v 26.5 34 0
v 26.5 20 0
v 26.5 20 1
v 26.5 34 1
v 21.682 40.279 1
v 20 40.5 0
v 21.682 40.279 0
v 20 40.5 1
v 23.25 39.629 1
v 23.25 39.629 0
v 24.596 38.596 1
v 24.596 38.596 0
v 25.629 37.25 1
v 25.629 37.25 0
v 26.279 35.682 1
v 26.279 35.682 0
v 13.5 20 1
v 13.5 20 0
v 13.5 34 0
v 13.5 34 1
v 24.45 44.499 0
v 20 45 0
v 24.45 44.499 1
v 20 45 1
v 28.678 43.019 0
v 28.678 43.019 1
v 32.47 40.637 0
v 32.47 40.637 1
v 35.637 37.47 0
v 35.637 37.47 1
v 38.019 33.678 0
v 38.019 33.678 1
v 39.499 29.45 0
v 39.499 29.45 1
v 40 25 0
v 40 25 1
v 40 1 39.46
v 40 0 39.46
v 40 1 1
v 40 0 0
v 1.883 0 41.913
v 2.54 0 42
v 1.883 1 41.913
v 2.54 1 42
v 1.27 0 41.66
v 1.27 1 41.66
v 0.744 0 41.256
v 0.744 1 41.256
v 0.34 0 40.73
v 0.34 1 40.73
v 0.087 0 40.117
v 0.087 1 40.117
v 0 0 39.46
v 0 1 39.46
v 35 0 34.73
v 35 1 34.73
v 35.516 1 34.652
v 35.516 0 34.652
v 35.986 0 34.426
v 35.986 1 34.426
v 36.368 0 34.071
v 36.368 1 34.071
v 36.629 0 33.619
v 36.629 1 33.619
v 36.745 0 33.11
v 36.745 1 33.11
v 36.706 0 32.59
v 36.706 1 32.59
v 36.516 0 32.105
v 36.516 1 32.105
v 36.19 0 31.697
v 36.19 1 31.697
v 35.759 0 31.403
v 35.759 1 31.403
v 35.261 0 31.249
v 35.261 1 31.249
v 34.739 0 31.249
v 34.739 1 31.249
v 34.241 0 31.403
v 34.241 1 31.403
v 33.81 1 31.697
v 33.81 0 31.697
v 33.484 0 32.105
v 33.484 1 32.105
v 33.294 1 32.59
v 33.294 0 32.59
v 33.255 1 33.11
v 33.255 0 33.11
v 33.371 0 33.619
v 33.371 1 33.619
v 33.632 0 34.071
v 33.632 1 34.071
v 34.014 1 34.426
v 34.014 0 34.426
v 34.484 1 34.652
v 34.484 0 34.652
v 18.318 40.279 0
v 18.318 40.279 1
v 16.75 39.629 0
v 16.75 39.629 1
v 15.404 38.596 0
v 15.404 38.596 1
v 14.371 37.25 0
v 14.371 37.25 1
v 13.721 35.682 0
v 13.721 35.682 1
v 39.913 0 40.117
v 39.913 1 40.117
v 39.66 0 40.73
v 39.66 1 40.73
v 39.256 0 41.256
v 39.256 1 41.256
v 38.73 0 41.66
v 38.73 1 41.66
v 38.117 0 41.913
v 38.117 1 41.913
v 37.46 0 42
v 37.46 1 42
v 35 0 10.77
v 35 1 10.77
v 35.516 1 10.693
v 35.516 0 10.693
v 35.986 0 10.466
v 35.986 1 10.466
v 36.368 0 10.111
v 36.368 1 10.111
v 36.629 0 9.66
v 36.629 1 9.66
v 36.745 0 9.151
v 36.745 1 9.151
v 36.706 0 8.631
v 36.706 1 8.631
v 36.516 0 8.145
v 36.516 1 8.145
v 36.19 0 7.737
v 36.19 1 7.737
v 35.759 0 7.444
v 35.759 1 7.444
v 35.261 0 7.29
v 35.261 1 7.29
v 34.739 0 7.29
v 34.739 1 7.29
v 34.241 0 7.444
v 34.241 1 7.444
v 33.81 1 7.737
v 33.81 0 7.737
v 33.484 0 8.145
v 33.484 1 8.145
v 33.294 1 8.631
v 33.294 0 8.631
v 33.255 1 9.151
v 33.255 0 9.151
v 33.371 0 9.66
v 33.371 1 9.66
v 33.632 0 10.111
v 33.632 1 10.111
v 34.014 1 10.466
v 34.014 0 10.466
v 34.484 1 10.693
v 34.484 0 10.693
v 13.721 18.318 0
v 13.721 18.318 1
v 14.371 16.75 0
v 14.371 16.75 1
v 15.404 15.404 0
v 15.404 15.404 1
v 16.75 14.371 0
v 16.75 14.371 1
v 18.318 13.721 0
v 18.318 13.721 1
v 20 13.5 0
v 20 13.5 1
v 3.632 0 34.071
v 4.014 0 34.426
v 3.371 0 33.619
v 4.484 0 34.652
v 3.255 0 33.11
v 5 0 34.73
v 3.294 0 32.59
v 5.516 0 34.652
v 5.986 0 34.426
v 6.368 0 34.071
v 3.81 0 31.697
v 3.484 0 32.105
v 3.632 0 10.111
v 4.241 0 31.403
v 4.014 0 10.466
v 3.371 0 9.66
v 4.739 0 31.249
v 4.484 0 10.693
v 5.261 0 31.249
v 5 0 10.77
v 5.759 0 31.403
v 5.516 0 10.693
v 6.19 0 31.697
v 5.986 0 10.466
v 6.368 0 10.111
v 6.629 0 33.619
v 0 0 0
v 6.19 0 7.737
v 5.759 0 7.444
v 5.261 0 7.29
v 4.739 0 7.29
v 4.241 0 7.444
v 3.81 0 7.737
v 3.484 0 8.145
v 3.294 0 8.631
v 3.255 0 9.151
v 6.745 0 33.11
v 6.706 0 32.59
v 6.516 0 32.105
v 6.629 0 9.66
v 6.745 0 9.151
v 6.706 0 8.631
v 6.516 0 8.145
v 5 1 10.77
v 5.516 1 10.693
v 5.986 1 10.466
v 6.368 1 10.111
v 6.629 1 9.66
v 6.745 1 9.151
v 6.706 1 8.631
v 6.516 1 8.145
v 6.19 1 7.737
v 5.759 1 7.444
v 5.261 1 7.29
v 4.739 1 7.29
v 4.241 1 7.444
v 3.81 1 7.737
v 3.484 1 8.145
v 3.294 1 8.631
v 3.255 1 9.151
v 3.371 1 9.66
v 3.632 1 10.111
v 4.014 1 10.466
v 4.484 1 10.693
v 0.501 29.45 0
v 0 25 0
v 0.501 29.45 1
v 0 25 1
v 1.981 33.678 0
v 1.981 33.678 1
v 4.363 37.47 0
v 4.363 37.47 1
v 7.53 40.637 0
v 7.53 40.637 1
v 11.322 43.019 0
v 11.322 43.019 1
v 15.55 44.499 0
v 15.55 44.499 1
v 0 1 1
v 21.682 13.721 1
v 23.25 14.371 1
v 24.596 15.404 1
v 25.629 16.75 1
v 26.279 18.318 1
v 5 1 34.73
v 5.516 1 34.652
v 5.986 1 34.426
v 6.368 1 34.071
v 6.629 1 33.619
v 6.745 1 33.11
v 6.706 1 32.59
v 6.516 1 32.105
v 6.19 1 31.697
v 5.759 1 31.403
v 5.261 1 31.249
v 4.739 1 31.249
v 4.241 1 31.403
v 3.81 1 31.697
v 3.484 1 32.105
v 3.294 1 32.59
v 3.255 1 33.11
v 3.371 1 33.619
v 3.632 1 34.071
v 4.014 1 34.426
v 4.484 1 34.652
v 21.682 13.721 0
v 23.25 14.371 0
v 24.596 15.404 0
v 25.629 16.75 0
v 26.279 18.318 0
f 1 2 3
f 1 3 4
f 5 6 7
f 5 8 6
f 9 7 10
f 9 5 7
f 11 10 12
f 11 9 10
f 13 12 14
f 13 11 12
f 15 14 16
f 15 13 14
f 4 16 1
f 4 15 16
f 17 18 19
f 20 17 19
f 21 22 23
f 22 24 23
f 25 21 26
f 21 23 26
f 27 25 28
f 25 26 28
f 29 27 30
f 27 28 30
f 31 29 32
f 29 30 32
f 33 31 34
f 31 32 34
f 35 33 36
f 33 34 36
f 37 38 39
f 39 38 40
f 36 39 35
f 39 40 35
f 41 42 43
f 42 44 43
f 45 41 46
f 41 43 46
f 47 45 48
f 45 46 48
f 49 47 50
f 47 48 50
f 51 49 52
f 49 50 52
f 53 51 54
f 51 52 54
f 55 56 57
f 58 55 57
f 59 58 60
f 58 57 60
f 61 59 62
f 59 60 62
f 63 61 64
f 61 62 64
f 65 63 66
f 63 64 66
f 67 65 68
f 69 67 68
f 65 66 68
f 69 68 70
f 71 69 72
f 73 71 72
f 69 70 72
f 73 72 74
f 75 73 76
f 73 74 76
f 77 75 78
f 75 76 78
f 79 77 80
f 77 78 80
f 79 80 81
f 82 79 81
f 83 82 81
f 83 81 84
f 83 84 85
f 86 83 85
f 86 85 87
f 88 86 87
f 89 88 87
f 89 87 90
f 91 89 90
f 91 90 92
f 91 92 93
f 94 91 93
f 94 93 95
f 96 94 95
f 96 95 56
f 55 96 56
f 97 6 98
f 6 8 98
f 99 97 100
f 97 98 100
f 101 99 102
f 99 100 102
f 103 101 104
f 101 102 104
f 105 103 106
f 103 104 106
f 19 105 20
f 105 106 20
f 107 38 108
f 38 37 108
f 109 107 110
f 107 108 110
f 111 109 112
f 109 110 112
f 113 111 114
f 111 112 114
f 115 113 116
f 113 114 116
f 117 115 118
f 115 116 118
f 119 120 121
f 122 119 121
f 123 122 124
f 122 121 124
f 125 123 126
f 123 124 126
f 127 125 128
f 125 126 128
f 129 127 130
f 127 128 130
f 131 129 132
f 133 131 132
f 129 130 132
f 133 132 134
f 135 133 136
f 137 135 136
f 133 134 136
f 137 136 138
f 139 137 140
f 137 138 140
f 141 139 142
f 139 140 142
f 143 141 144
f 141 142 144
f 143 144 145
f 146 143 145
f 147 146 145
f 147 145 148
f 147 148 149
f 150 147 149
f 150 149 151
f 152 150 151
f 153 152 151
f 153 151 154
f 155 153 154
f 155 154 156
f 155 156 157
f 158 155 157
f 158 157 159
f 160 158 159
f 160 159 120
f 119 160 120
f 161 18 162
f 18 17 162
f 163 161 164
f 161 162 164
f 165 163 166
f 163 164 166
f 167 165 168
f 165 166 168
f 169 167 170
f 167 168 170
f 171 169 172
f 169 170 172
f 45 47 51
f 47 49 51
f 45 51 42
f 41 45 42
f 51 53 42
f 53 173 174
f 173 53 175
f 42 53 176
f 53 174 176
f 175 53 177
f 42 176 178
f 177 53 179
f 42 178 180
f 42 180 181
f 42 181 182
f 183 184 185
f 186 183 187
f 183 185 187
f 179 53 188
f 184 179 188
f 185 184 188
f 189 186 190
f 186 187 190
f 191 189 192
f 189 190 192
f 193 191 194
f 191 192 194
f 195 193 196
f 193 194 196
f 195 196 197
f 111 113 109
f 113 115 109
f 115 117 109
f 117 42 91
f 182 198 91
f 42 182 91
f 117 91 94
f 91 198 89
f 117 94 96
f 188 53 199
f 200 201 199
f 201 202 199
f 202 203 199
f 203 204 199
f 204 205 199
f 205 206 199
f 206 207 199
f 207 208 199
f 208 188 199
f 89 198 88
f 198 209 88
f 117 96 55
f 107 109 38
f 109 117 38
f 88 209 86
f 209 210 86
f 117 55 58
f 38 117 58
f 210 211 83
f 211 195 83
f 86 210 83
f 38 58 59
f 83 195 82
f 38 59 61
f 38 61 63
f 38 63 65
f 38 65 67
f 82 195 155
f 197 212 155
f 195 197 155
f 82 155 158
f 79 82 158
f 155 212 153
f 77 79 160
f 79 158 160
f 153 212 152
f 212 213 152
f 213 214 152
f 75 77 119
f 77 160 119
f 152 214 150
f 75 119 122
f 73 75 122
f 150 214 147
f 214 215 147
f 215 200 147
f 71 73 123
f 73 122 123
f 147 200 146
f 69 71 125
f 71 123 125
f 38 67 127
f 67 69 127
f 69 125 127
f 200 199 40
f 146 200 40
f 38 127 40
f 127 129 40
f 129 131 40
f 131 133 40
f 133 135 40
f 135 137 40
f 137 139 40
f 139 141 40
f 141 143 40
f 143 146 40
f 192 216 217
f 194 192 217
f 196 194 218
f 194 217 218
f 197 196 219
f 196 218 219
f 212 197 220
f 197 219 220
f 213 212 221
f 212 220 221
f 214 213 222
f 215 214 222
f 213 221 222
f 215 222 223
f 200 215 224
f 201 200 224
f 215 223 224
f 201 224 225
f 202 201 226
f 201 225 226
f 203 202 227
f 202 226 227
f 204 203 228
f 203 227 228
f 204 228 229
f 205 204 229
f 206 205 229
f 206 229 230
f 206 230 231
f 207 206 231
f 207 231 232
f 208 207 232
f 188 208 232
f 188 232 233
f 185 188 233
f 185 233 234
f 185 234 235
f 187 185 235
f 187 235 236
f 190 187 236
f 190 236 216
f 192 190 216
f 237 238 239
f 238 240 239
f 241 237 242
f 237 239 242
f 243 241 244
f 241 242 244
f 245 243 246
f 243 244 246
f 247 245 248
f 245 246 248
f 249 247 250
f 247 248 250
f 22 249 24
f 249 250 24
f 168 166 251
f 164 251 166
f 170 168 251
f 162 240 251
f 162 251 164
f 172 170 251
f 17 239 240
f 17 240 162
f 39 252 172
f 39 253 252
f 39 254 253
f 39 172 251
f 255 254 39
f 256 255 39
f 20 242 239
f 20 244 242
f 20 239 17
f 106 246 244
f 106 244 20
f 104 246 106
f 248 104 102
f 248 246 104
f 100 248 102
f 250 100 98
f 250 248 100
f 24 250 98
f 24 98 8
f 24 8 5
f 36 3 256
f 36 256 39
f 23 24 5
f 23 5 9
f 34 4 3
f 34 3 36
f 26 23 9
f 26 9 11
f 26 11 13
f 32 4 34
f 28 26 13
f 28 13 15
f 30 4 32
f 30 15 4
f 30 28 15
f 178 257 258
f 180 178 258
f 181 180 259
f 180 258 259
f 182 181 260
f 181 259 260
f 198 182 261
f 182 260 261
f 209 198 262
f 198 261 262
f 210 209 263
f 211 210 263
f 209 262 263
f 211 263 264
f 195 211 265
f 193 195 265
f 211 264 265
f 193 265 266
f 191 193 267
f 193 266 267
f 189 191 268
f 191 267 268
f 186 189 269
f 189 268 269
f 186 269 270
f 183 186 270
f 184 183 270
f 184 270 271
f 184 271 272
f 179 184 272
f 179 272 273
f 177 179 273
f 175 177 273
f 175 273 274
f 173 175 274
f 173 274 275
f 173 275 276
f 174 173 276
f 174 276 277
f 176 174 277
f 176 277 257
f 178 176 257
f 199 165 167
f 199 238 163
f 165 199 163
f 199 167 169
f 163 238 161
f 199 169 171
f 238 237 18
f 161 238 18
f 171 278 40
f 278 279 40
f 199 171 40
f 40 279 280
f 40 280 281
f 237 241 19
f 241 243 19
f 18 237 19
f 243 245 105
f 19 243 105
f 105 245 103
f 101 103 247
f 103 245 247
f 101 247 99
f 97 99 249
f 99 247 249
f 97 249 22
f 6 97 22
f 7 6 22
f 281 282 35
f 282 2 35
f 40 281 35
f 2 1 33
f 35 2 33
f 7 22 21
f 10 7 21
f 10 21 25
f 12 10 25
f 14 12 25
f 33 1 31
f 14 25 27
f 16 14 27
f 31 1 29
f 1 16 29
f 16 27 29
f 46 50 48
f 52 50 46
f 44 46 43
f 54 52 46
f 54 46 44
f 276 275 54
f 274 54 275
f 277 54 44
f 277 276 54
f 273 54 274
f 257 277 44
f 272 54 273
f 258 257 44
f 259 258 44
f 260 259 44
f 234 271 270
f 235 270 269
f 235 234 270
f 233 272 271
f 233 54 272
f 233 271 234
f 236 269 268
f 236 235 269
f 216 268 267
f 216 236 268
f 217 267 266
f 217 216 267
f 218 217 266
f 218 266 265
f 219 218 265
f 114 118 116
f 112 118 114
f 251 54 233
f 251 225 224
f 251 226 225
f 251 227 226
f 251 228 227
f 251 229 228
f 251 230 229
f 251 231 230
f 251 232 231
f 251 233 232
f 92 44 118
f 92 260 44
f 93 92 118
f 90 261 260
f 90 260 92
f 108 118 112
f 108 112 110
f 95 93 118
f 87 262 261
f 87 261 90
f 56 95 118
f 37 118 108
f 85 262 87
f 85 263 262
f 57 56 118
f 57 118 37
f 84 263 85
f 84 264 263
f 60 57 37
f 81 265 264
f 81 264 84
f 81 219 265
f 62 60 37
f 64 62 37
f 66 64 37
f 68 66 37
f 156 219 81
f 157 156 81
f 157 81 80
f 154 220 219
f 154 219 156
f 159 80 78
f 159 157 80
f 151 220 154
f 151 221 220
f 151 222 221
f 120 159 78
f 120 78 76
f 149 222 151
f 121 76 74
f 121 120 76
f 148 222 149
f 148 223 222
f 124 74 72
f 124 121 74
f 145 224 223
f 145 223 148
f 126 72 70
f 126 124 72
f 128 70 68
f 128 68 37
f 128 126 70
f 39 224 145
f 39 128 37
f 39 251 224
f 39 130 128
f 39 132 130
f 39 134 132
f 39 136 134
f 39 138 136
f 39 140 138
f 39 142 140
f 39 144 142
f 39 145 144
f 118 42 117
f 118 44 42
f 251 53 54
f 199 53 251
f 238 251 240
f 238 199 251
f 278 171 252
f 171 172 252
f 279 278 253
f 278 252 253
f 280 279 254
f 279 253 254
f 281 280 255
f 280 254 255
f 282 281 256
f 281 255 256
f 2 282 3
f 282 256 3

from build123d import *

# Parameters (mm, degrees)
SKETCH1_W             = 40
SKETCH1_H             = 44.999999916
VERTICAL_BASE_DEPTH   = 1
TOP_ROUNDING_R        = 20
TOP_ROUNDING_2_R      = 20
SKETCH2_W             = 40
SKETCH2_H             = 1
HORIZONTAL_BASE_DEPTH = 41
FILLET3_R             = 2.54
FILLET4_R             = 2.54
SKETCH3_R             = 1.75
MOUNTING_HOLES_DEPTH  = 73.801098842
SKETCH5_W             = 13
SKETCH5_H             = 27
CUT_EXTRUDE2_DEPTH    = 74.409808557
FILLET5_R             = 6.5
FILLET6_R             = 6.5
FILLET7_R             = 6.5
FILLET8_R             = 6.5


with BuildPart() as part:
    # Sketch1 → Vertical-Base (new body)
    with BuildSketch(Plane.XY):
        with Locations((20, 22.499999958)):
            Rectangle(SKETCH1_W, SKETCH1_H)
    extrude(amount=VERTICAL_BASE_DEPTH)

    # Top-Rounding
    top_rounding_edges = [part.edges().sort_by_distance(p)[0] for p in [
        (0, 44.999999916, 0.5),
    ]]
    fillet(top_rounding_edges, radius=TOP_ROUNDING_R)

    # Top-Rounding-2
    top_rounding_2_edges = [part.edges().sort_by_distance(p)[0] for p in [
        (40, 44.999999916, 0.5),
    ]]
    fillet(top_rounding_2_edges, radius=TOP_ROUNDING_2_R - 0.0001)  # a hair under: the kernel refuses the full size

    # Sketch2 → Horizontal-Base (add)
    with BuildSketch(Plane.XY.offset(1)):
        with Locations((20, 0.5)):
            Rectangle(SKETCH2_W, SKETCH2_H)
    extrude(amount=HORIZONTAL_BASE_DEPTH)

    # Fillet3
    fillet3_edges = [part.edges().sort_by_distance(p)[0] for p in [
        (40, 0.5, 42),
    ]]
    fillet(fillet3_edges, radius=FILLET3_R)

    # Fillet4
    fillet4_edges = [part.edges().sort_by_distance(p)[0] for p in [
        (0, 0.5, 42),
    ]]
    fillet(fillet4_edges, radius=FILLET4_R)

    # Sketch3 → Mounting Holes (cut, through all)
    with BuildSketch(Plane(origin=(0, 1, 0), x_dir=(1, 0, 0), z_dir=(0, 1, 0))):
        with Locations(Location((35, -32.979707006, 0), (0, 0, 270))):
            Circle(SKETCH3_R)
        with Locations(Location((5, -32.979707006, 0), (0, 0, 270))):
            Circle(SKETCH3_R)
        with Locations(Location((5, -9.020292994, 0), (0, 0, 270))):
            Circle(SKETCH3_R)
        with Locations(Location((35, -9.020292994, 0), (0, 0, 270))):
            Circle(SKETCH3_R)
    extrude(amount=-MOUNTING_HOLES_DEPTH, mode=Mode.SUBTRACT)

    # Sketch5 → Cut-Extrude2 (cut, through all)
    with BuildSketch(Plane(origin=(0, 0, 0), x_dir=(-1, 0, 0), z_dir=(0, 0, -1))):
        with Locations((-20, 27)):
            Rectangle(SKETCH5_W, SKETCH5_H)
    extrude(amount=-CUT_EXTRUDE2_DEPTH, mode=Mode.SUBTRACT)

    # Fillet5
    fillet5_edges = [part.edges().sort_by_distance(p)[0] for p in [
        (13.5, 40.5, 0.5),
    ]]
    fillet(fillet5_edges, radius=FILLET5_R)

    # Fillet6
    fillet6_edges = [part.edges().sort_by_distance(p)[0] for p in [
        (26.5, 40.5, 0.5),
    ]]
    fillet(fillet6_edges, radius=FILLET6_R - 0.0001)  # a hair under: the kernel refuses the full size

    # Fillet7
    fillet7_edges = [part.edges().sort_by_distance(p)[0] for p in [
        (13.5, 13.5, 0.5),
    ]]
    fillet(fillet7_edges, radius=FILLET7_R)

    # Fillet8
    fillet8_edges = [part.edges().sort_by_distance(p)[0] for p in [
        (26.5, 13.5, 0.5),
    ]]
    fillet(fillet8_edges, radius=FILLET8_R - 0.0001)  # a hair under: the kernel refuses the full size


solid = part.part
